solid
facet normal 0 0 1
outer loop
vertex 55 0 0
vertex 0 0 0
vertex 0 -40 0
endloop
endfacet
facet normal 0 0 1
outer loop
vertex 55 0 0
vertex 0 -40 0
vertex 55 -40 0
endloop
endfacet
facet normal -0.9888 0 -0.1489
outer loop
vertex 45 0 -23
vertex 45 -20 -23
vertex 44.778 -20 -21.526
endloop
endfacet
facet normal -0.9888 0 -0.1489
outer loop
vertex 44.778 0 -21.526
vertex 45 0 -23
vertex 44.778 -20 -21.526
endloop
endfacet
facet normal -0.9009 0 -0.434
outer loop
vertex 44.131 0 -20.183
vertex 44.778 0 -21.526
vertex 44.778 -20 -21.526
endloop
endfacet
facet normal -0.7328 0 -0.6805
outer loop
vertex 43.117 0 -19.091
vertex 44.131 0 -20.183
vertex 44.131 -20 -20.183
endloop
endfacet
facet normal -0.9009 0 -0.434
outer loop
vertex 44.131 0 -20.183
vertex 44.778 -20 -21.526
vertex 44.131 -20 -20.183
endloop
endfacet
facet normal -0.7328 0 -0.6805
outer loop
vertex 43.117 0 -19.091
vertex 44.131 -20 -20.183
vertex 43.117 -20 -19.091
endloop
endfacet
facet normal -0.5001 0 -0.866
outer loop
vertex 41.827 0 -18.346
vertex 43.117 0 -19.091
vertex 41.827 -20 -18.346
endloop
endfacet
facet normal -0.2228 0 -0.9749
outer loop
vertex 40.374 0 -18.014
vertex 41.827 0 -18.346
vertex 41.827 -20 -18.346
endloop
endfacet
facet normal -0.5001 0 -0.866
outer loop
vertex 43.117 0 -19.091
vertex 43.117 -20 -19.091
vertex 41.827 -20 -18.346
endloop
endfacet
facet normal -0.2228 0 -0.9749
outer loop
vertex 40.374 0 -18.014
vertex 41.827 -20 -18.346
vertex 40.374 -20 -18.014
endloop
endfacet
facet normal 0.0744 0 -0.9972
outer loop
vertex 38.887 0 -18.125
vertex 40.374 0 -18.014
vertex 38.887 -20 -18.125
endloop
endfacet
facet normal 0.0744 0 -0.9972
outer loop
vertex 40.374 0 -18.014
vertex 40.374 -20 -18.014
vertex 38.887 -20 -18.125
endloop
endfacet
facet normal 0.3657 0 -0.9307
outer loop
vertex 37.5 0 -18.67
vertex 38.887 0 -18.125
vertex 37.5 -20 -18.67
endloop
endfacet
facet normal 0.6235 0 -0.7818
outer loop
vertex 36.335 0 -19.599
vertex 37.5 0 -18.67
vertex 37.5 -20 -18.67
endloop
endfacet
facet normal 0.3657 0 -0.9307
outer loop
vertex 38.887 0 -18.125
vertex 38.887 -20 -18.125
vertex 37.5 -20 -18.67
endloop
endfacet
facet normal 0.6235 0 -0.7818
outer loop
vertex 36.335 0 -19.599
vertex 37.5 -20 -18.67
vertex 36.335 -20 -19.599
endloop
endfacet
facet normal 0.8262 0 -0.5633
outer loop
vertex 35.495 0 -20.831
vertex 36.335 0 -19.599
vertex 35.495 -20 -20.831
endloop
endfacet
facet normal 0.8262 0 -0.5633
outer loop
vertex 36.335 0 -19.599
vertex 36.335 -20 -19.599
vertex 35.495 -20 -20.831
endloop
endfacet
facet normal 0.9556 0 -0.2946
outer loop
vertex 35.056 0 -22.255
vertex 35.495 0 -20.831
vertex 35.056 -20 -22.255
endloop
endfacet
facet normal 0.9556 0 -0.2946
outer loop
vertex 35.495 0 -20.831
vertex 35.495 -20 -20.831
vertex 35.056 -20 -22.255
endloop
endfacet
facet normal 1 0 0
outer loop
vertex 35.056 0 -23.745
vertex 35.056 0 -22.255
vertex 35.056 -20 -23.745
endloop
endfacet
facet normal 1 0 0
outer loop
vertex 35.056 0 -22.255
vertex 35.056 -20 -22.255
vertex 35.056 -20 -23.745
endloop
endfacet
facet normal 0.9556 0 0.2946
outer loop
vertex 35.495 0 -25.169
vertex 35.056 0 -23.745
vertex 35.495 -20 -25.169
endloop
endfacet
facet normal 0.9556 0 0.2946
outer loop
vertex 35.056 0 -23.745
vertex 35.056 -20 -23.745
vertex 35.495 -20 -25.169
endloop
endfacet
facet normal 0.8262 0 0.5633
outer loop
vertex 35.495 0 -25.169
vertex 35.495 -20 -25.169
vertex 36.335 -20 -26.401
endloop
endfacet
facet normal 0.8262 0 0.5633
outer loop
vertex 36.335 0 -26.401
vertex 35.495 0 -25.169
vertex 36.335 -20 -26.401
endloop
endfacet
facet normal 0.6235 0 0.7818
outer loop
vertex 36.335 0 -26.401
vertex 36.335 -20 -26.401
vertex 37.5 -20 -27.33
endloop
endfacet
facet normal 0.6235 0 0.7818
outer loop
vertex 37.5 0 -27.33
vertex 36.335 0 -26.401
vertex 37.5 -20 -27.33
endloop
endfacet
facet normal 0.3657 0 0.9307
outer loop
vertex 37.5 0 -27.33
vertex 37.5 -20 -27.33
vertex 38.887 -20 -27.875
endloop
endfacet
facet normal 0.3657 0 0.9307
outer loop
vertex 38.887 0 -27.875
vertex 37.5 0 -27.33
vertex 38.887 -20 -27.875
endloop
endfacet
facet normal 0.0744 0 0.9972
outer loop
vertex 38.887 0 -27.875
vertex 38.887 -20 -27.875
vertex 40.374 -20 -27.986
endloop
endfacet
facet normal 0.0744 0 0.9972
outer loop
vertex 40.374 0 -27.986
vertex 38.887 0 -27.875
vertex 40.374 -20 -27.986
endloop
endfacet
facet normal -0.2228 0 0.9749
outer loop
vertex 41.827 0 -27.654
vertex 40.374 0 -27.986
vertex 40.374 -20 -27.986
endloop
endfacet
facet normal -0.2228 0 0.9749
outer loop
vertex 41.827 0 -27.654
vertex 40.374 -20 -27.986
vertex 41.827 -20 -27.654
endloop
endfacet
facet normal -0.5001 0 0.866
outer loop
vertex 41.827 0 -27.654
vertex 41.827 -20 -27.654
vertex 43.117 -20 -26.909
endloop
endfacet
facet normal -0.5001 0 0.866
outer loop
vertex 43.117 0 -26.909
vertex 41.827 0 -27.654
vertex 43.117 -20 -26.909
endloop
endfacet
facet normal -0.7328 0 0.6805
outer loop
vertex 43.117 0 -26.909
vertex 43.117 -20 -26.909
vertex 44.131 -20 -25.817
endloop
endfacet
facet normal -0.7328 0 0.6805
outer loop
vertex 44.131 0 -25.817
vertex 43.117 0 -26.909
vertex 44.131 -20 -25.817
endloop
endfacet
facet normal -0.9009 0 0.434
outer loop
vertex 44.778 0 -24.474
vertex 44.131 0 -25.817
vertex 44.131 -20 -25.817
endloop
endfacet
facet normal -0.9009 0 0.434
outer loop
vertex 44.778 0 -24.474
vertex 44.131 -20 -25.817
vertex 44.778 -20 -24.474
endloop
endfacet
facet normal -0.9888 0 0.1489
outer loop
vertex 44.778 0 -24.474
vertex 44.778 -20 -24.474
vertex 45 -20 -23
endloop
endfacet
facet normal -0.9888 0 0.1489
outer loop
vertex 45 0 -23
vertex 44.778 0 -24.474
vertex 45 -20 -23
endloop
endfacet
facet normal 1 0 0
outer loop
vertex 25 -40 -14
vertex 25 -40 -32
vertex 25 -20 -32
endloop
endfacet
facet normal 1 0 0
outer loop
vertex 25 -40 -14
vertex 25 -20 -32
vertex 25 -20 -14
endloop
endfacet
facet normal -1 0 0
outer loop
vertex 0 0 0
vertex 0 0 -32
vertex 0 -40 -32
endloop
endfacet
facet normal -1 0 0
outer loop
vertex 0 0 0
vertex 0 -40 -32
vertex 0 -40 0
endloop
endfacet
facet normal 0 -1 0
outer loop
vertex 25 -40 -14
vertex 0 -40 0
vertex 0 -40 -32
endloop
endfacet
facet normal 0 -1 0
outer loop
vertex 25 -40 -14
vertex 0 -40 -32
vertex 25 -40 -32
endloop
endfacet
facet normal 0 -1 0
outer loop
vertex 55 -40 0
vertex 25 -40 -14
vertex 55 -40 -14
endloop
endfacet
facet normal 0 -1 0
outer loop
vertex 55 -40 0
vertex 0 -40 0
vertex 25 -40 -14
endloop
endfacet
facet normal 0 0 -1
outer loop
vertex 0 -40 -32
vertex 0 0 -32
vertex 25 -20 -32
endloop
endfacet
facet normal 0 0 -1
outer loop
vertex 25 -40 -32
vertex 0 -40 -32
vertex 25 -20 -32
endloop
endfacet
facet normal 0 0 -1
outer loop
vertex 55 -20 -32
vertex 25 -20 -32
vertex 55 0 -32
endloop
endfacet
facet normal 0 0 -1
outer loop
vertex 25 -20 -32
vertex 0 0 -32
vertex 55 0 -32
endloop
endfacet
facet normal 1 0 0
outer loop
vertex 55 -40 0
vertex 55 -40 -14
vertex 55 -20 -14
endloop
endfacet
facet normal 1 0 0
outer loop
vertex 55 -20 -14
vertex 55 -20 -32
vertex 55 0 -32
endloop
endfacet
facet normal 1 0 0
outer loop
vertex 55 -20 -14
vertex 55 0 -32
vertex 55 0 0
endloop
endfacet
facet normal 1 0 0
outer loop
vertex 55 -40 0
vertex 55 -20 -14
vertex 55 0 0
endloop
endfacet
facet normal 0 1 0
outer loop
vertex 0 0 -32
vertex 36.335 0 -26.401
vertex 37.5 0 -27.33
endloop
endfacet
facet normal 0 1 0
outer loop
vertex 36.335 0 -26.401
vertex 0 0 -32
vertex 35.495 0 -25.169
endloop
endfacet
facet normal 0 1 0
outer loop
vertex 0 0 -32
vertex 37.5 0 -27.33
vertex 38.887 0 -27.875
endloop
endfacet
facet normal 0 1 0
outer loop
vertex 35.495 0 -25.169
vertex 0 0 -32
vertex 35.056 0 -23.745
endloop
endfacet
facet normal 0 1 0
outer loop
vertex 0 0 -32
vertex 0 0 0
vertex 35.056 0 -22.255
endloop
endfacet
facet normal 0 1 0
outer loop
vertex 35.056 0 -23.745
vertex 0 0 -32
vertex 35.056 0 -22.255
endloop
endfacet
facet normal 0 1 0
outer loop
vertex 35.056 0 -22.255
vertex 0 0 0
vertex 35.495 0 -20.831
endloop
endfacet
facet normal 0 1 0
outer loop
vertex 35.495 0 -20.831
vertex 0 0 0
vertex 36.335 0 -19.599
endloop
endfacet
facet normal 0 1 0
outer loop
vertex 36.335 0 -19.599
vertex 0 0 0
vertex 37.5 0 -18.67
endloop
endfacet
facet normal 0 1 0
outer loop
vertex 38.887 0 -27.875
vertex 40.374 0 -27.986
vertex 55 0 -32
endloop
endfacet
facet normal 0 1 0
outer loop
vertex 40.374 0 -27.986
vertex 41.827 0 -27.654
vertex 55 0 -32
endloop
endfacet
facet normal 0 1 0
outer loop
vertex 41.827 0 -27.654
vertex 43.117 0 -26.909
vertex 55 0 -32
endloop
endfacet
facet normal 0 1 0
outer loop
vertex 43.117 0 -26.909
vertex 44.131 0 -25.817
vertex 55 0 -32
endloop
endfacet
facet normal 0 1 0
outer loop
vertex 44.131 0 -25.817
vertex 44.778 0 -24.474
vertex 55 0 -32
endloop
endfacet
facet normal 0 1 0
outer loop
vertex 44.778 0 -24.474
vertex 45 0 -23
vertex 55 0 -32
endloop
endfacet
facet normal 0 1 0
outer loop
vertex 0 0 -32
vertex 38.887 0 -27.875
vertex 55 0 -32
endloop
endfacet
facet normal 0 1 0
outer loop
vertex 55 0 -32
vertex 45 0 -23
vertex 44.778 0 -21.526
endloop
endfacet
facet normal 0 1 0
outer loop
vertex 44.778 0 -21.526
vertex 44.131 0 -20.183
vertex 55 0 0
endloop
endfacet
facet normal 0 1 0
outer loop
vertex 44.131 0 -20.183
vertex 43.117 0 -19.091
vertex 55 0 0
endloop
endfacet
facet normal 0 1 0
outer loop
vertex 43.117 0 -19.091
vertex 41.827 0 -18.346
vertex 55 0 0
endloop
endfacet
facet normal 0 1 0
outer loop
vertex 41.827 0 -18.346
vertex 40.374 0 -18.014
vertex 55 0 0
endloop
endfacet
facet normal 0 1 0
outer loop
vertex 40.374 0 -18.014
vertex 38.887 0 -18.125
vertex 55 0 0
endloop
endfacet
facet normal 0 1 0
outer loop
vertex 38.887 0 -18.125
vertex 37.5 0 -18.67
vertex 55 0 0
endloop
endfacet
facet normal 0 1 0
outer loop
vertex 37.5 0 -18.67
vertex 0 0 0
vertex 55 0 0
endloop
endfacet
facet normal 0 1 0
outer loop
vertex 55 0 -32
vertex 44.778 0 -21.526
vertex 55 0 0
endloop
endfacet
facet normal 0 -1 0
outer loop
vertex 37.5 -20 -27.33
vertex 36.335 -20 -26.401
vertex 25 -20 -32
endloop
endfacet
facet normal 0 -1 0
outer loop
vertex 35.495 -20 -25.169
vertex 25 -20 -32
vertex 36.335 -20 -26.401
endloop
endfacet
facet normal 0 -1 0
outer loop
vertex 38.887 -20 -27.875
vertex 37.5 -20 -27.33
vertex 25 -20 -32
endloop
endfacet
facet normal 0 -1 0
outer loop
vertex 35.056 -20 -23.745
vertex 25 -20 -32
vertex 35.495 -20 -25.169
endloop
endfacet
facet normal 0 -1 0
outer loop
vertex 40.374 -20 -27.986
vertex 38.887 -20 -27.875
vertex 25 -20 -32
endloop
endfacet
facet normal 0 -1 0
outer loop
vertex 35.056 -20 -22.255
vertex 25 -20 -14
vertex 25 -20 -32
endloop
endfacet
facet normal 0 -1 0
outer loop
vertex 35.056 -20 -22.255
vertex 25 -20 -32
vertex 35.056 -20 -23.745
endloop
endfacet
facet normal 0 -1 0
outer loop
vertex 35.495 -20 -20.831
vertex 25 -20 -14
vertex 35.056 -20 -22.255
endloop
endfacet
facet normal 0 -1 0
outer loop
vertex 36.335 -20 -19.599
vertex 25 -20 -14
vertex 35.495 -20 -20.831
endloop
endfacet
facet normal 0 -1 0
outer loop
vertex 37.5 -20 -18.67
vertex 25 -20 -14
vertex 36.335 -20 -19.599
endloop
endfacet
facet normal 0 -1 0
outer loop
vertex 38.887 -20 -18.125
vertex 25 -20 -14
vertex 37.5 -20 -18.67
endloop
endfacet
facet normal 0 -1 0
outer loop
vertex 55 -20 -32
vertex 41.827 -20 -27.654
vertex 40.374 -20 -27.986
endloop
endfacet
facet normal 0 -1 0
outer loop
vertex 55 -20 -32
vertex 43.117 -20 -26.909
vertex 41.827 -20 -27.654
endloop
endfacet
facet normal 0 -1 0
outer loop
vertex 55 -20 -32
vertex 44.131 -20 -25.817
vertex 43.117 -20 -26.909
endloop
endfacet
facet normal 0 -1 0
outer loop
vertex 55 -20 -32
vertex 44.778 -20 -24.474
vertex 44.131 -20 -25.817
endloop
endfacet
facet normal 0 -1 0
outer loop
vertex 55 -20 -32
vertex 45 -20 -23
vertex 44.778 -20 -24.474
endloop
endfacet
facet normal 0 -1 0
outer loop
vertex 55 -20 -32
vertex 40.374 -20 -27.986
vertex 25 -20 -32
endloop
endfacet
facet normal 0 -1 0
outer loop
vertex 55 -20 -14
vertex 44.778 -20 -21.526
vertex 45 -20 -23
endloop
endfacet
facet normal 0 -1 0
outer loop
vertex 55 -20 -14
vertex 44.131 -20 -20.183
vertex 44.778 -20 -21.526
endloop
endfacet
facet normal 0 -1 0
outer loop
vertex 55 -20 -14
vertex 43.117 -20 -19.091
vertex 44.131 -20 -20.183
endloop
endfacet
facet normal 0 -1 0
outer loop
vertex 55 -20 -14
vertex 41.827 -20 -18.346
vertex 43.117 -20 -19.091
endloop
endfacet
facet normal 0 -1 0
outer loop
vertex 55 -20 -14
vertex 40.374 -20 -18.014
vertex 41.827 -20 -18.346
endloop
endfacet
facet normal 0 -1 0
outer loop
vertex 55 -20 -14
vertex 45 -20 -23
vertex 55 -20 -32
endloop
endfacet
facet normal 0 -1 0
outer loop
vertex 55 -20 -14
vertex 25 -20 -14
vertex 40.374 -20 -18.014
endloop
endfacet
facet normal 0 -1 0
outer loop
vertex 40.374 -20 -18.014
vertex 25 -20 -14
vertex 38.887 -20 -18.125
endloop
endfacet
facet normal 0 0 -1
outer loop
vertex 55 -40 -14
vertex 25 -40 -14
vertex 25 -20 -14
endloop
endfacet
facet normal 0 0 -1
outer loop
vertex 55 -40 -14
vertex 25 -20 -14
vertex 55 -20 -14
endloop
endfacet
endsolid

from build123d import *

# Parameters (mm, degrees)
F0_W     = 55
F0_H     = 32
F1_DEPTH = 40
F2_W     = 30
F2_H     = 18
F3_DEPTH = 20
F4_R     = 5
F5_DEPTH = 20.001


with BuildPart() as f1:
    # F0 (on Front) → F1 (new body)
    with BuildSketch(Plane.XZ):
        with Locations((27.5, -16)):
            Rectangle(F0_W, F0_H)
    extrude(amount=F1_DEPTH)

    # F2 (on face) → F3 (cut)
    with BuildSketch(Plane.XZ.offset(40)):
        with Locations((40, -23)):
            Rectangle(F2_W, F2_H)
    extrude(amount=-F3_DEPTH, mode=Mode.SUBTRACT)

    # F4 (on face) → F5 (cut, through all)
    with BuildSketch(Plane.XZ.offset(20)):
        with Locations((40, -23)):
            Circle(F4_R)
    extrude(amount=-F5_DEPTH, mode=Mode.SUBTRACT)


solid = f1.part
